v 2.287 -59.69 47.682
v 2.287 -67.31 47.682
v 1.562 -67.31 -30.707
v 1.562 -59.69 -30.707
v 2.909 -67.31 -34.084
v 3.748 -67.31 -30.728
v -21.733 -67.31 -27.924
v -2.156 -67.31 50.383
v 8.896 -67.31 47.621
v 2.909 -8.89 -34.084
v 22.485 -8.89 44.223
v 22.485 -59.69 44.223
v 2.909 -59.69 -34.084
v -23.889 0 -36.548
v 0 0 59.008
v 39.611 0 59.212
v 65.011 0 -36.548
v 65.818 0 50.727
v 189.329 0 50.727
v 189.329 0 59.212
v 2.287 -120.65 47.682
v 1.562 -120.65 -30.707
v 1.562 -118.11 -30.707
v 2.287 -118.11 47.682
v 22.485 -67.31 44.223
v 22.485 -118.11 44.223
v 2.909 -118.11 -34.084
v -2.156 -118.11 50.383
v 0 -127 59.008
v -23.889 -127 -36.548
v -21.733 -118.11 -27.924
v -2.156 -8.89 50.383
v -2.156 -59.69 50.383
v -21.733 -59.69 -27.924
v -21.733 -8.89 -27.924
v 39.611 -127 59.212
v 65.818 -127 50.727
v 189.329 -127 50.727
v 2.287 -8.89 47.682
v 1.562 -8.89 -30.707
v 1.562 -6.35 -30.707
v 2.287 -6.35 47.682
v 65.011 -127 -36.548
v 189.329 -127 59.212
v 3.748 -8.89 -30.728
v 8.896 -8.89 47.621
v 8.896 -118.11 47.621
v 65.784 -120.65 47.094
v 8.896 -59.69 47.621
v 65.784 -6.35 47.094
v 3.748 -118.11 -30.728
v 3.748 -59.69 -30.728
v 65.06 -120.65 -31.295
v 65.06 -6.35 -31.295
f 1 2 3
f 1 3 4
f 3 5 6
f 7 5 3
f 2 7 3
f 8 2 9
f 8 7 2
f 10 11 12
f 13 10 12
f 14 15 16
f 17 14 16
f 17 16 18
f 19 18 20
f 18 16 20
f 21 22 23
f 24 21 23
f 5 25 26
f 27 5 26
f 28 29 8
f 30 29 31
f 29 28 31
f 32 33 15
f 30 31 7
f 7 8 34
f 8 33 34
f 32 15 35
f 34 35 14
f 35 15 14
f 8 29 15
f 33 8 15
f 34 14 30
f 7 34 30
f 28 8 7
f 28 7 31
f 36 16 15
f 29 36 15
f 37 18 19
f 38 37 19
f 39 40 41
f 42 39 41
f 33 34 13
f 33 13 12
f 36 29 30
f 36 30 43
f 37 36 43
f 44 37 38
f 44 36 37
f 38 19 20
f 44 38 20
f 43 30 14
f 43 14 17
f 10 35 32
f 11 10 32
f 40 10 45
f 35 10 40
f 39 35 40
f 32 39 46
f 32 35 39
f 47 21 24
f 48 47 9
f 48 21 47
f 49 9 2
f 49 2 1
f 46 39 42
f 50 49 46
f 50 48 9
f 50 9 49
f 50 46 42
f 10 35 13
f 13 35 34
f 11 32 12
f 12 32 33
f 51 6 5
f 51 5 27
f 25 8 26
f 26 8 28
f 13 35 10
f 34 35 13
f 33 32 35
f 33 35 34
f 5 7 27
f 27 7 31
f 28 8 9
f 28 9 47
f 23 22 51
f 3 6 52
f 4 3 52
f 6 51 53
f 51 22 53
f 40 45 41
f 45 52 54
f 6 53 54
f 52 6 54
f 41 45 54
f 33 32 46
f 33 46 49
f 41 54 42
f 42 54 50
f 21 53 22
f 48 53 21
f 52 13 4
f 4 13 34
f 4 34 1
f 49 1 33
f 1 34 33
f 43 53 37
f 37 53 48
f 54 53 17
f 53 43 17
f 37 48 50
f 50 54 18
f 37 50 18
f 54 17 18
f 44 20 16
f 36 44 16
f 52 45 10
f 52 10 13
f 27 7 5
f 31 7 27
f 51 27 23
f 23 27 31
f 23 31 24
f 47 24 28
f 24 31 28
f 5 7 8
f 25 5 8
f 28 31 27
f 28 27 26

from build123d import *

# Parameters (mm, degrees)
F1_DEPTH = 127
F2_W     = 114.3
F2_H     = 78.3924195651
F3_DEPTH = 63.5
F4_W     = 50.8
F4_H     = 80.7171528415
F5_DEPTH = 25.4
F6_DEPTH = 25.4


with BuildPart() as f1:
    # F0 (on Front) → F1 (new body)
    with BuildSketch(Plane.XZ):
        Polygon((39.6109314713, 59.2122177594), (0, 59.0080402892), (-23.8890685287, -36.5482338256), (65.0109314713, -36.5482338256), (65.8180707803, 50.7267867081), (189.3294194156, 50.7267867081), (189.3294194156, 59.2122177594), align=None)
    extrude(amount=F1_DEPTH)

    # F2 (on face) → F3 (cut)
    with BuildSketch(Plane(origin=(65.3433490805, 0, -0.6043102058), x_dir=(0, 1, 0), z_dir=(0.9999572379, 0, -0.0092478328))):
        with Locations((-63.5, 8.5045392761)):
            Rectangle(F2_W, F2_H)
    extrude(amount=-F3_DEPTH, mode=Mode.SUBTRACT)

    # F4 (on face) → F5 (cut)
    with BuildSketch(Plane(origin=(-13.8842447739, 0, 3.4710611935), x_dir=(0, -1, 0), z_dir=(-0.9701425001, 0, 0.242535625))):
        with Locations((34.29, 7.9976313141)):
            Rectangle(F4_W, F4_H)
        with Locations((92.71, 7.9976313141)):
            Rectangle(F4_W, F4_H)
    extrude(amount=-F5_DEPTH, mode=Mode.SUBTRACT)


with BuildPart() as f6:
    # F4 (on face) → F6 (new body)
    with BuildSketch(Plane(origin=(-13.8842447739, 0, 3.4710611935), x_dir=(0, -1, 0), z_dir=(-0.9701425001, 0, 0.242535625))):
        with Locations((34.29, 7.9976313141)):
            Rectangle(F4_W, F4_H)
    extrude(amount=-F6_DEPTH)


with BuildPart() as f6b:
    # F4 (on face) → F6, piece 2 (new body)
    with BuildSketch(Plane(origin=(-13.8842447739, 0, 3.4710611935), x_dir=(0, -1, 0), z_dir=(-0.9701425001, 0, 0.242535625))):
        with Locations((92.71, 7.9976313141)):
            Rectangle(F4_W, F4_H)
    extrude(amount=-F6_DEPTH)


solid = Compound([f1.part, f6.part, f6b.part])
